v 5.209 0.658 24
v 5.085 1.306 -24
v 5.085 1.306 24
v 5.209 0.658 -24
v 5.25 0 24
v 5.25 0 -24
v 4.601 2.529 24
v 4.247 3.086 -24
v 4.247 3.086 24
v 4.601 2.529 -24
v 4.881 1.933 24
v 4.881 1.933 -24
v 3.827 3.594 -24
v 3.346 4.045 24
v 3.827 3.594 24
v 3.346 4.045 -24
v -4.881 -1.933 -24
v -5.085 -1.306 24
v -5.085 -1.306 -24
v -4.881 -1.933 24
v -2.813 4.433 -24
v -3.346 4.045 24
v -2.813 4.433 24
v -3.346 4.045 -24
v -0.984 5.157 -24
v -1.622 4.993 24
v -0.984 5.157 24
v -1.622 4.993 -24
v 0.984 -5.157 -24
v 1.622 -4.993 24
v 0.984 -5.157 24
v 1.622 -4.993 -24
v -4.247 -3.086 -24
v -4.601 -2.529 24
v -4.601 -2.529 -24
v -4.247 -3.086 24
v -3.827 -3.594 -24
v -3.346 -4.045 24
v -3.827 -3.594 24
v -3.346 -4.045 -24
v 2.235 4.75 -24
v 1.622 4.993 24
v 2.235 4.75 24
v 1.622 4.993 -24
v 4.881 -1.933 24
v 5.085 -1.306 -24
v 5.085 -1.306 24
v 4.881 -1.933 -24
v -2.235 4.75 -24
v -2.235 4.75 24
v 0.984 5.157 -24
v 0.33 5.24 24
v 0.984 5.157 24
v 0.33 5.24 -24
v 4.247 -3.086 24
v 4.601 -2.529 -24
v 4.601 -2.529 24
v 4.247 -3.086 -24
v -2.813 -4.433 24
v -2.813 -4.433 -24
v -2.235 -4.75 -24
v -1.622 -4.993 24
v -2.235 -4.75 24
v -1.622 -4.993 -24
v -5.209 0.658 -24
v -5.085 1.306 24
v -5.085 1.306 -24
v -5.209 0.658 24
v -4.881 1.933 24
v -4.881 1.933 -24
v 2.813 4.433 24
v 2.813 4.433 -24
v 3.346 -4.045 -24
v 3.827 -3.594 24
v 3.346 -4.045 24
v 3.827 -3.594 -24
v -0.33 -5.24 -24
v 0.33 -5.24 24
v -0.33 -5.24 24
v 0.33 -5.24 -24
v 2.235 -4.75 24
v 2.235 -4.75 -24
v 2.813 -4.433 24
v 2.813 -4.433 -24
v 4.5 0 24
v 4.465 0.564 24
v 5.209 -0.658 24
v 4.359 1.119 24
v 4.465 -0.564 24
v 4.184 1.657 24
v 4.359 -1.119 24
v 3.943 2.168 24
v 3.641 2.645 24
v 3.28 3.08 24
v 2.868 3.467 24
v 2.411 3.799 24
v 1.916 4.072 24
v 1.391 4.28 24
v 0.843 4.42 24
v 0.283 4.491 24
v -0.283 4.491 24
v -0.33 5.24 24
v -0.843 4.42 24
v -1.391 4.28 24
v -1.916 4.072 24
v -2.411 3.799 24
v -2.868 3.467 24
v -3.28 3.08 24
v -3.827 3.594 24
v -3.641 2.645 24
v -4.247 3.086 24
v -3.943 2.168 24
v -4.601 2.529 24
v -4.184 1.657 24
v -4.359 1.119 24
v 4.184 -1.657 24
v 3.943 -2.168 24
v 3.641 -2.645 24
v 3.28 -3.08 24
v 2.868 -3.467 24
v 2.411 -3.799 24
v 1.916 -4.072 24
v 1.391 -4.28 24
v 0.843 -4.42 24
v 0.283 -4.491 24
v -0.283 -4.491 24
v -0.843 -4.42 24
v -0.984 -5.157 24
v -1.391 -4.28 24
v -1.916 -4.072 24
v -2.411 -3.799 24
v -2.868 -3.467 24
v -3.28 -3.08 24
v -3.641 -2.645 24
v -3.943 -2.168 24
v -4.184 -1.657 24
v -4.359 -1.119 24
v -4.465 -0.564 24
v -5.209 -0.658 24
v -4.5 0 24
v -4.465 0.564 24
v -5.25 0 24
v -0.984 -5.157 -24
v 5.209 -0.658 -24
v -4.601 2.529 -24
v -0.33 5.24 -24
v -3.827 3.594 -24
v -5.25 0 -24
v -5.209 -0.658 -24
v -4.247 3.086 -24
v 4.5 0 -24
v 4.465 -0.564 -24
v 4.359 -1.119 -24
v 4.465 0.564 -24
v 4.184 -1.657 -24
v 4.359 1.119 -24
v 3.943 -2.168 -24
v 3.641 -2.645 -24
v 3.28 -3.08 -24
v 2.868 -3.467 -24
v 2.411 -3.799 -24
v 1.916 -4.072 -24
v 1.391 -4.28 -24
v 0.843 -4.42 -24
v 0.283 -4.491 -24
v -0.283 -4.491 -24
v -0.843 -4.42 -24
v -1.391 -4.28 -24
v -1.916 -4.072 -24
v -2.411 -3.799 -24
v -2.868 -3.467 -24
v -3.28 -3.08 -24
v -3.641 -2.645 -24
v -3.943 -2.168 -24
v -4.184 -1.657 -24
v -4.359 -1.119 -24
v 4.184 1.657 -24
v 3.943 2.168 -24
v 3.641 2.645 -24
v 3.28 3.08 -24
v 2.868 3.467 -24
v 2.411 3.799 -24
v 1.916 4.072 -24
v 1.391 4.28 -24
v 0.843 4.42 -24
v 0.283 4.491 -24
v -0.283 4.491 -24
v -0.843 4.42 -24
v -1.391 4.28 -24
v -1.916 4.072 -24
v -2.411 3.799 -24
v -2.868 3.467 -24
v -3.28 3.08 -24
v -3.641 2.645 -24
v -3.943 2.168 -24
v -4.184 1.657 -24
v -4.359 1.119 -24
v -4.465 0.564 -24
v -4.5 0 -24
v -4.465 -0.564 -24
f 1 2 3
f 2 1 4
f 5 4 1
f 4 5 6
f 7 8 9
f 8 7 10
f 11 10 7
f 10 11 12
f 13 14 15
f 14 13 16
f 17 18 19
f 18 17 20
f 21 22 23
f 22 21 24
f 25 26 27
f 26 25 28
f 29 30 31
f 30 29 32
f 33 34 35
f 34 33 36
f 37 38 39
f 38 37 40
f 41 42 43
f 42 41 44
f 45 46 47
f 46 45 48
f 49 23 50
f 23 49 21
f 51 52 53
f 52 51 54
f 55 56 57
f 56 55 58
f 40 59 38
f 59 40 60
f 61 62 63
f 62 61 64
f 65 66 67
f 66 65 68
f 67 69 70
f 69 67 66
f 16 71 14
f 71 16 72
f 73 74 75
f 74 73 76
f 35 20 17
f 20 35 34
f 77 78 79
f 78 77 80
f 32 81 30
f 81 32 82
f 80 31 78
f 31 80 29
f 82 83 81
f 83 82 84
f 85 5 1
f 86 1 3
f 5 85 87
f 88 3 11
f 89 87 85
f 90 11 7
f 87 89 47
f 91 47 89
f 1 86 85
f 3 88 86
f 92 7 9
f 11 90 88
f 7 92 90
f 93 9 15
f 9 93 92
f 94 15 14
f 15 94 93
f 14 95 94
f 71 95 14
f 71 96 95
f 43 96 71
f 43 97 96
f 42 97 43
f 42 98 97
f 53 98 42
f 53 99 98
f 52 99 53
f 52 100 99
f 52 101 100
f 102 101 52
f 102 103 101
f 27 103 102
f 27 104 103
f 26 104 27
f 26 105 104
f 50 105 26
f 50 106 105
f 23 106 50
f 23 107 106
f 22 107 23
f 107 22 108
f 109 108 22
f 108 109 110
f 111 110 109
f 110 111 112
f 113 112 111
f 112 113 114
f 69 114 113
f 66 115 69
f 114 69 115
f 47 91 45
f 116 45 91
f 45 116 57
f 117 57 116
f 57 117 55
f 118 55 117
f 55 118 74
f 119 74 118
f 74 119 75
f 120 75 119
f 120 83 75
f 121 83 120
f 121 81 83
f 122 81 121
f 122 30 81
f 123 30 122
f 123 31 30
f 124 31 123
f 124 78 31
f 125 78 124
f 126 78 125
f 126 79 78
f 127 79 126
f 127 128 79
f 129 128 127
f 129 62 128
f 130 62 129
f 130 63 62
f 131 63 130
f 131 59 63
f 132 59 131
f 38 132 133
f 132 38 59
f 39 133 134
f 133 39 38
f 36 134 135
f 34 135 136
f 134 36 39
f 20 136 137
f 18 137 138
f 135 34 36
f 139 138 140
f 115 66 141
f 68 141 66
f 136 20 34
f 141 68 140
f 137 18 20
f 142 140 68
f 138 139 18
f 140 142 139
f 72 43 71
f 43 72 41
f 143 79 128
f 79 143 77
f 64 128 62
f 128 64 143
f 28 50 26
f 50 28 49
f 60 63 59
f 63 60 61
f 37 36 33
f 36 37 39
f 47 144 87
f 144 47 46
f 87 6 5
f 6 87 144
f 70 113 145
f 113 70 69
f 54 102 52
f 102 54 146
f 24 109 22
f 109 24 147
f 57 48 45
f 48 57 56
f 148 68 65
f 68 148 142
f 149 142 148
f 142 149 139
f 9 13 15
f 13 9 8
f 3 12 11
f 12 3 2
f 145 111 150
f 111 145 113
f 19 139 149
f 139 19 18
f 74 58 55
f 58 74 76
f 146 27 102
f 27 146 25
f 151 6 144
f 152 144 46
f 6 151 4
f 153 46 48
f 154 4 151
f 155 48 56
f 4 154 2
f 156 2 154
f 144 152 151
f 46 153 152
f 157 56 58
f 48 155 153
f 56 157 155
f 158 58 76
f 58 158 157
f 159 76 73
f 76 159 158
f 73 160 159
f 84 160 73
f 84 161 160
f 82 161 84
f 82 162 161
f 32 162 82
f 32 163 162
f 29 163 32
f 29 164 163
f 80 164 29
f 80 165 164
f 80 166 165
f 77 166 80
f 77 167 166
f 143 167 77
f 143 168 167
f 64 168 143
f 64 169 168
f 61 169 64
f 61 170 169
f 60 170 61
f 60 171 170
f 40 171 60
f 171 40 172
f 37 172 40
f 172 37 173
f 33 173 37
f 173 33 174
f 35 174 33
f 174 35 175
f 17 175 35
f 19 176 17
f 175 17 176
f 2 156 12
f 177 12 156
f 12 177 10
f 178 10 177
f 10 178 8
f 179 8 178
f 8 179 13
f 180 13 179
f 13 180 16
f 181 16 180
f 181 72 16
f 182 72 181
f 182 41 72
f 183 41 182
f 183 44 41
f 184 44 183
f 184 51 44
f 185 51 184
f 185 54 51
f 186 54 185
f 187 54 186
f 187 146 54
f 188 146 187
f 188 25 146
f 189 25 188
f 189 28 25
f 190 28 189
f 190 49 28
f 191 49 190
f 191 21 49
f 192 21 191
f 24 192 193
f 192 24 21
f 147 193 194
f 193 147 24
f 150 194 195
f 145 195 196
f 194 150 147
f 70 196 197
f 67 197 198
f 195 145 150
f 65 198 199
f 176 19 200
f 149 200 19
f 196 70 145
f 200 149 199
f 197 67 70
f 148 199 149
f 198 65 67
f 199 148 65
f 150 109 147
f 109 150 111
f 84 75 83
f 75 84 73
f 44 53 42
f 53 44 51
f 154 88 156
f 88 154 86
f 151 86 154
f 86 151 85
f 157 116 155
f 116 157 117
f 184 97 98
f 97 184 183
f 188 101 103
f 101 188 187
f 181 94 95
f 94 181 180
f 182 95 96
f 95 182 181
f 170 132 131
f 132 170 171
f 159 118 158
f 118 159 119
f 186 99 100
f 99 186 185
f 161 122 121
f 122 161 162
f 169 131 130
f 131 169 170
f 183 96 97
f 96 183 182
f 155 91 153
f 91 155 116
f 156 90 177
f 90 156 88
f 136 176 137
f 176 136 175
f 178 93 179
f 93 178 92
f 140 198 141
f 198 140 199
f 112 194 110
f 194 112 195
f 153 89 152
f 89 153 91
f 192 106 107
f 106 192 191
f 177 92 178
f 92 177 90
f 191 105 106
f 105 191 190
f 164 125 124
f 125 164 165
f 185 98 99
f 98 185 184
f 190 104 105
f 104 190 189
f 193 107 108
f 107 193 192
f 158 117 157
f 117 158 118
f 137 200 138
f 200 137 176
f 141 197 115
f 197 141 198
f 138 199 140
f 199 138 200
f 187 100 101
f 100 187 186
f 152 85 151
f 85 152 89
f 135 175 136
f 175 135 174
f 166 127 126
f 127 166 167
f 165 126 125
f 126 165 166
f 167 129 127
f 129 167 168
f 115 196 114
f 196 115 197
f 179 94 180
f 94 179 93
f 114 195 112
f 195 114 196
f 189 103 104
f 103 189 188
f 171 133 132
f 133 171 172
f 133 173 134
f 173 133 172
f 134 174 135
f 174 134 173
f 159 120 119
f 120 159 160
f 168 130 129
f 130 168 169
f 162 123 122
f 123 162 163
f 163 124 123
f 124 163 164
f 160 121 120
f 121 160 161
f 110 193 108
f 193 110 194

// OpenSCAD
$fn = 50;


difference() {
	union() {
		translate(v = [0, 0, -24.0000000000]) {
			cylinder(h = 48, r = 5.2500000000);
		}
	}
	union() {
		translate(v = [0, 0, -100.0000000000]) {
			cylinder(h = 200, r = 4.5000000000);
		}
	}
}
